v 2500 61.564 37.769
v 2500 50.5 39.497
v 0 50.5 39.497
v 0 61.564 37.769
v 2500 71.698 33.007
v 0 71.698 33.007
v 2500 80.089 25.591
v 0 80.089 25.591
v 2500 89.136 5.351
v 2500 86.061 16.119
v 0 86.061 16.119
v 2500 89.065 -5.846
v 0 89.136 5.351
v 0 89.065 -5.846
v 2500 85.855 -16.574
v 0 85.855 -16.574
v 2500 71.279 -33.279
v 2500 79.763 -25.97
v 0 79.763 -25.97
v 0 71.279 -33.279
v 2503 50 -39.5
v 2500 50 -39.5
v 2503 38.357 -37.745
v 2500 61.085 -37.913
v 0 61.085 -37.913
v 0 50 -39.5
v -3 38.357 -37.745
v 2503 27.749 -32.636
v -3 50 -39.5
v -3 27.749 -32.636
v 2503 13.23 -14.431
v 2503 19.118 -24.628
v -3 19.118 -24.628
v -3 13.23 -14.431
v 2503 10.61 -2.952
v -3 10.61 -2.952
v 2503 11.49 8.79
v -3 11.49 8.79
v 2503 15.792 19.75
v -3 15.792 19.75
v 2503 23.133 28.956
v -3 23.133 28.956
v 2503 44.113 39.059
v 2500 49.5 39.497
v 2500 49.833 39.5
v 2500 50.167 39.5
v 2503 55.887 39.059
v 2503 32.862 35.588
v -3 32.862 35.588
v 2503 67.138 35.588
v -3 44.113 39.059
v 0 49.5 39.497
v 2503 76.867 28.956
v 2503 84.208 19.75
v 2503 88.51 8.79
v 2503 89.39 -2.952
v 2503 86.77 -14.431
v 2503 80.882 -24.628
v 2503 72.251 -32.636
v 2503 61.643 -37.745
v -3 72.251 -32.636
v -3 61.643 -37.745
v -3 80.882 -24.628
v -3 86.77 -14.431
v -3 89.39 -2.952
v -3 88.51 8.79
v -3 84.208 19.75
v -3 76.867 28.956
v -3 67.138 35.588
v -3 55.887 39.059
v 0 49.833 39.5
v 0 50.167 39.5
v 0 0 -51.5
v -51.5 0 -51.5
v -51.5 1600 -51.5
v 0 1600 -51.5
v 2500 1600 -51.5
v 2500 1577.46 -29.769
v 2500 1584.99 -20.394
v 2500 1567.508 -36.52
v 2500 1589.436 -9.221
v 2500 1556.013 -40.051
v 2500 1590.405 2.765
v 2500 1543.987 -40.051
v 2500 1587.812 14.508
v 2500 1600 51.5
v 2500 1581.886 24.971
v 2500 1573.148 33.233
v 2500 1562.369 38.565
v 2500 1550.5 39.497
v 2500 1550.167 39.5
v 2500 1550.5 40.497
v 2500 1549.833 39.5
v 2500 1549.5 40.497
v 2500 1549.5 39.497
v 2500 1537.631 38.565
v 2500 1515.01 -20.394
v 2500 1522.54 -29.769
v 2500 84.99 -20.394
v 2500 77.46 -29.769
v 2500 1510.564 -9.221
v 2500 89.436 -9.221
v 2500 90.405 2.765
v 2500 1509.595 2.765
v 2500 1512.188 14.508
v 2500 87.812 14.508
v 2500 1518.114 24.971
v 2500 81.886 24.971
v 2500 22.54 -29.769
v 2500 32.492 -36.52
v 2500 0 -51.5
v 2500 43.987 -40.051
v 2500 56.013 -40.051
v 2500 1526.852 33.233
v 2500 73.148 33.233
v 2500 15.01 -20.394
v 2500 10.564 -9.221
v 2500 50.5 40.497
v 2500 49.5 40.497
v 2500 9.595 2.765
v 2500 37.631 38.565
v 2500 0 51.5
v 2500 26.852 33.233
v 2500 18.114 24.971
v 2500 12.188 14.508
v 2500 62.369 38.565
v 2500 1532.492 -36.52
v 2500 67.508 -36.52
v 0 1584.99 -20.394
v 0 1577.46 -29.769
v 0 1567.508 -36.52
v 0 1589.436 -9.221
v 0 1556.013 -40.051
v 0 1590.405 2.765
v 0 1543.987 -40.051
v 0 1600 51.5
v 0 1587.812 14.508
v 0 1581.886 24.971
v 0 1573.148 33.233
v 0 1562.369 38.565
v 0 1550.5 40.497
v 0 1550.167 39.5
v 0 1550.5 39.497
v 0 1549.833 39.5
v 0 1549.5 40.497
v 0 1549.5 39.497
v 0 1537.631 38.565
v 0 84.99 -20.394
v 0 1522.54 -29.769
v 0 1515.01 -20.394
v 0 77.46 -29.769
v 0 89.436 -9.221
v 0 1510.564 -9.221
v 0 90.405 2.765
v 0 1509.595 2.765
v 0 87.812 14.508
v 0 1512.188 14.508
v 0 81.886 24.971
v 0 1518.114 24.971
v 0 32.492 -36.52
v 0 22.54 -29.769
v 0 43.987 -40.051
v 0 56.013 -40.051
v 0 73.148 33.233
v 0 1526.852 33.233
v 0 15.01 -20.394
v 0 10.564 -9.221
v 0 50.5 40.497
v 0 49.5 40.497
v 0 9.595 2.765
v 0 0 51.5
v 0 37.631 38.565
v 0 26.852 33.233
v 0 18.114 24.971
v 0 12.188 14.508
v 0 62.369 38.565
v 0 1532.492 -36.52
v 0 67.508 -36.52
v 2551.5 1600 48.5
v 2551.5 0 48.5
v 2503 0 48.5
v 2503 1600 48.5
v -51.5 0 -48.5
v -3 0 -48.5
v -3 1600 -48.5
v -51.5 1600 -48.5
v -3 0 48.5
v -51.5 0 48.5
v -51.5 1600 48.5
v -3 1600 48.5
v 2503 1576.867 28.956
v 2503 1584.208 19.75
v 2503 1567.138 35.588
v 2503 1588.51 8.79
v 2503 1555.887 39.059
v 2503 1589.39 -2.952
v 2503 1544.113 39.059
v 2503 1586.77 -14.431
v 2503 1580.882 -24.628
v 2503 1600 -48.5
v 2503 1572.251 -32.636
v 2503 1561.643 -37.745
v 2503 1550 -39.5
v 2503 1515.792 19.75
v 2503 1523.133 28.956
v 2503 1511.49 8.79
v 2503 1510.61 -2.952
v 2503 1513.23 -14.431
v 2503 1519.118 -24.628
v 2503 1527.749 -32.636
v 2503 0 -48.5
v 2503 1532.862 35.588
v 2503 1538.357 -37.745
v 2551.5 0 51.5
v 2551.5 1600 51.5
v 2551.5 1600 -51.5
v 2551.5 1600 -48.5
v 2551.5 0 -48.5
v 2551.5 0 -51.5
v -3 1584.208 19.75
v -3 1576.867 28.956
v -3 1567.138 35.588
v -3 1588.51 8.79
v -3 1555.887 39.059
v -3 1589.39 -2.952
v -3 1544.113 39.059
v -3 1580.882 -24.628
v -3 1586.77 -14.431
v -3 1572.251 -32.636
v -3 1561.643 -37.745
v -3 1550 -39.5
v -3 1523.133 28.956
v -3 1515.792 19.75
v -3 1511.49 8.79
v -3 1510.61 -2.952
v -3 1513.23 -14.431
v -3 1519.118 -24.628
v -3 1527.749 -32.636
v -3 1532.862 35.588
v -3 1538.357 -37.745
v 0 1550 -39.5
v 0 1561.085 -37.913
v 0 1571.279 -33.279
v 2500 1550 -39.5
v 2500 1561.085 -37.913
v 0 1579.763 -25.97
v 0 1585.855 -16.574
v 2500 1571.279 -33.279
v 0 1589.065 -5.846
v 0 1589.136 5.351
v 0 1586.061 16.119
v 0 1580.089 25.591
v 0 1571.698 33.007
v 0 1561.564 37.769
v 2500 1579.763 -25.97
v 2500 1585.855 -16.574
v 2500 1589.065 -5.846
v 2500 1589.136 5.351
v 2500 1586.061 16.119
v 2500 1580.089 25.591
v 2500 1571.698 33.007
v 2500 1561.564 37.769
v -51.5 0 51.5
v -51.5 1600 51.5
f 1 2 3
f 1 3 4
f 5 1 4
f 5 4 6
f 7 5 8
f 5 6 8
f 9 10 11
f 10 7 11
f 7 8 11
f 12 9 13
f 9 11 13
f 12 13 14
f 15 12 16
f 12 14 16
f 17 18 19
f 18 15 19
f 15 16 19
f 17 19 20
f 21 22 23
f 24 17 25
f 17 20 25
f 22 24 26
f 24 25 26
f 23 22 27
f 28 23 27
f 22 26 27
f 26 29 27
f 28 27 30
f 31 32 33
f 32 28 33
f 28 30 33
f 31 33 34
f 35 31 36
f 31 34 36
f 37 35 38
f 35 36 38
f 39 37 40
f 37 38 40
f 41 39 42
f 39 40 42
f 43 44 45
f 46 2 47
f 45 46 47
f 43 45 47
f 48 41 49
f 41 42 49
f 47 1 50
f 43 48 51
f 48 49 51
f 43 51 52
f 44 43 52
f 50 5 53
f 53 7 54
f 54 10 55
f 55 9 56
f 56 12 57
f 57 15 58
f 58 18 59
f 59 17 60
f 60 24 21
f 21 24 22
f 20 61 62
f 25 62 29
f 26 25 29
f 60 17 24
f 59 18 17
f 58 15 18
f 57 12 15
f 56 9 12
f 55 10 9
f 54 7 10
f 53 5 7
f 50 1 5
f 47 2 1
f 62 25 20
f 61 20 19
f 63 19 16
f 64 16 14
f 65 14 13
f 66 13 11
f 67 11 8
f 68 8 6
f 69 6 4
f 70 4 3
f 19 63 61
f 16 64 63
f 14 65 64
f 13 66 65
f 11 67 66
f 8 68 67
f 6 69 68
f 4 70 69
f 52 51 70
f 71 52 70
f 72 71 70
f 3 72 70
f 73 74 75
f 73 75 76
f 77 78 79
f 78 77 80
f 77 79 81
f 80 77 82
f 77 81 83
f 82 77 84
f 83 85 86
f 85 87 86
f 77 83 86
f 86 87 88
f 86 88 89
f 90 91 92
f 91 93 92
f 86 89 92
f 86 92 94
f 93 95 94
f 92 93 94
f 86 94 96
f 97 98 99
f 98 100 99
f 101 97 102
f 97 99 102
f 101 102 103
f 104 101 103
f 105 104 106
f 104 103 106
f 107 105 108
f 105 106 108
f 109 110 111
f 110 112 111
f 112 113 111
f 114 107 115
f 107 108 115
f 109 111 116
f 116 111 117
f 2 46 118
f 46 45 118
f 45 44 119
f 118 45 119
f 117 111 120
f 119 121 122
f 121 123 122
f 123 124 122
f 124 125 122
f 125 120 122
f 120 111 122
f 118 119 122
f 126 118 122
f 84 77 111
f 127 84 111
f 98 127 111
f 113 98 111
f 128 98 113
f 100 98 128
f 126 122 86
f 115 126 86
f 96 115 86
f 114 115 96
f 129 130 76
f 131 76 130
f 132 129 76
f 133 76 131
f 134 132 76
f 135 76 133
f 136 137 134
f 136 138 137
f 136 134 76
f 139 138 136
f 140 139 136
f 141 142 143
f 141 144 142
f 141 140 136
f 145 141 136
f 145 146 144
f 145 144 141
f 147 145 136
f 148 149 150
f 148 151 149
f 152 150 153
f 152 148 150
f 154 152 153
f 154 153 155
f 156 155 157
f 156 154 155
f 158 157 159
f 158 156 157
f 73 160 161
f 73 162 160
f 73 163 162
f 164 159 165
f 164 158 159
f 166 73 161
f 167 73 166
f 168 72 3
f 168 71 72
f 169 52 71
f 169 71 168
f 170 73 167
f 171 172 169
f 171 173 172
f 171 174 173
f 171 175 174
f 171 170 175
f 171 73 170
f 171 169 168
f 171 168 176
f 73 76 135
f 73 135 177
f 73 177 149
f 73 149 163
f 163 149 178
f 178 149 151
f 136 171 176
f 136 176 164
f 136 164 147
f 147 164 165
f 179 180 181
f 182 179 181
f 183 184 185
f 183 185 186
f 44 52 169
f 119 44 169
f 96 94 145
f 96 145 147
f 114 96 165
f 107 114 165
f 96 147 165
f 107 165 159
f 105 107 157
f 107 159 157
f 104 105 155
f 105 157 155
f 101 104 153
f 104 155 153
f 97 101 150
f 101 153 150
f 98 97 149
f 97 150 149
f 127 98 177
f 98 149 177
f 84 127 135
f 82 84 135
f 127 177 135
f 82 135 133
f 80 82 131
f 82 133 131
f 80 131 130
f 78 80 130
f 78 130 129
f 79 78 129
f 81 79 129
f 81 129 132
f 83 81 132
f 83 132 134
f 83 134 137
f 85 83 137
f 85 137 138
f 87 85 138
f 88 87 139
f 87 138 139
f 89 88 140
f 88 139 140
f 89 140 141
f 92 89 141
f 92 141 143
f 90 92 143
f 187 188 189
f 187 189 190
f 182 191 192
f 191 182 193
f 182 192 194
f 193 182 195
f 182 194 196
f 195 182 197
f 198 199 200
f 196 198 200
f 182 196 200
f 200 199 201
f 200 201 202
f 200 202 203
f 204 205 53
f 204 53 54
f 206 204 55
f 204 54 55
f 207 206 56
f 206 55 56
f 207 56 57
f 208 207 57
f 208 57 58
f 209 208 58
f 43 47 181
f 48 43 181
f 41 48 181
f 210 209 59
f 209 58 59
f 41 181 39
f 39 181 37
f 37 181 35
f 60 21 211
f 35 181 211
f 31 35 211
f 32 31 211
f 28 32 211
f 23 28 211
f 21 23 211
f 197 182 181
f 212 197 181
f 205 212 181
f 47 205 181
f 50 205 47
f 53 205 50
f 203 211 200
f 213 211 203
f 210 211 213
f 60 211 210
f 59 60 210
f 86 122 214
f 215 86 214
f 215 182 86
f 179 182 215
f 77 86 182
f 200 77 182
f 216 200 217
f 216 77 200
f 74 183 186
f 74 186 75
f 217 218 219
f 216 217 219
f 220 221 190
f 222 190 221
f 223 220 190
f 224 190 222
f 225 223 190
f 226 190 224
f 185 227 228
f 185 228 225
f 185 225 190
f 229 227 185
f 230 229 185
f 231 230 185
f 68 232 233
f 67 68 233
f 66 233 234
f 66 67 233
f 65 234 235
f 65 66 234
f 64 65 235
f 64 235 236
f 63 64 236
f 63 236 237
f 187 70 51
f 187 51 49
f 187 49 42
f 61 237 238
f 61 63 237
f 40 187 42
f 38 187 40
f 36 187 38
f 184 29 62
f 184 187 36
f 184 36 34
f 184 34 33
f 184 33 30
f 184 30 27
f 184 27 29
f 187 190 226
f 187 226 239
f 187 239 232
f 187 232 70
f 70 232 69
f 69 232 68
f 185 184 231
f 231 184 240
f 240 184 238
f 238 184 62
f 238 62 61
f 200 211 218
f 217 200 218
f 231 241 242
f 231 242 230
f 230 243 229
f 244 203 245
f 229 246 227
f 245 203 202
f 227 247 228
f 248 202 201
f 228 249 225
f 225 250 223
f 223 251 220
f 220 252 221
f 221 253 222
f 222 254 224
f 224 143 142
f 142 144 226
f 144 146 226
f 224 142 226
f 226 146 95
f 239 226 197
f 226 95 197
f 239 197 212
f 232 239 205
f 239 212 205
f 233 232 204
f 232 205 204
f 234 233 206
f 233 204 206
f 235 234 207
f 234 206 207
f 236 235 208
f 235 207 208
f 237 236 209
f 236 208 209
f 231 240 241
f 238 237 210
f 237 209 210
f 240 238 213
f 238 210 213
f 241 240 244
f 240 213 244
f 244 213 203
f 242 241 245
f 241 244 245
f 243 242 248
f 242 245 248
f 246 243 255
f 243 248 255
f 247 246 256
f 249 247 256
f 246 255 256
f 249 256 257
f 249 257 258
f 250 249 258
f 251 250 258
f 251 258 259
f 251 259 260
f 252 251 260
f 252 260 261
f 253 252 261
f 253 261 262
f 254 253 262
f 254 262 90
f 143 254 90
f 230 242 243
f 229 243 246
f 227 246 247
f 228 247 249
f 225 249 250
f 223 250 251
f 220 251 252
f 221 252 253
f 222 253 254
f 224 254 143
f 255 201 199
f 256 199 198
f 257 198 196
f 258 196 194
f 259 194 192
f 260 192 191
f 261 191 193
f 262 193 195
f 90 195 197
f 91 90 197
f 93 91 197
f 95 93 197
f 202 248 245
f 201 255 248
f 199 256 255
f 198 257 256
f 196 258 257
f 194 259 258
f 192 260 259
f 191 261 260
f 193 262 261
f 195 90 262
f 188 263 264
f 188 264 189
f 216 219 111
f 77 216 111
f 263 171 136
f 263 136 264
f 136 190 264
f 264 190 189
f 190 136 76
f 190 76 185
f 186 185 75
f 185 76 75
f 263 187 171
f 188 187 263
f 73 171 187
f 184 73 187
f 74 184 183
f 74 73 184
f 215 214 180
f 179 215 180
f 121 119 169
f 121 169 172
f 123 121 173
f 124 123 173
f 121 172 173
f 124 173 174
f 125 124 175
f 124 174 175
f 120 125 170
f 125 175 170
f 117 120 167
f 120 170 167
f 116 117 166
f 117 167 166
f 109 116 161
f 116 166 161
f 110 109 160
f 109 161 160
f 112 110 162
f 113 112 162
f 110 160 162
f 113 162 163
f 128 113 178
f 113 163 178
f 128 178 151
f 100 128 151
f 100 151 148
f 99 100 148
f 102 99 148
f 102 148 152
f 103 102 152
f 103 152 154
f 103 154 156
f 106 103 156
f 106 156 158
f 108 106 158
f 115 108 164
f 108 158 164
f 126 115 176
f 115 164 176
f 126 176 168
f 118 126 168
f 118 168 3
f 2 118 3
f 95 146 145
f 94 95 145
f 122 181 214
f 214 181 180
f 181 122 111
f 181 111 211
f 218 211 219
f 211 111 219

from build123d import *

# Parameters (mm, degrees)
BOSS_EXTRUDE1_DEPTH     = 1600
BOSS_EXTRUDE1_2_DEPTH   = 1600
SKETCH4_R               = 39.5
CUT_EXTRUDE2_DEPTH      = 2552.5
CUT_EXTRUDE2_DEPTH_BACK = 52.5
BOSS_EXTRUDE2_DEPTH     = 2500


with BuildPart() as part:
    # Sketch3 → Boss-Extrude1 (new body)
    with BuildSketch(Plane(origin=(0, 0, 0), x_dir=(1, 0, 0), z_dir=(0, 1, 0))):
        Polygon((-51.5, 51.5), (0, 51.5), (0, -51.5), (-51.5, -51.5), (-51.5, -48.5), (-3, -48.5), (-3, 48.5), (-51.5, 48.5), align=None)
    extrude(amount=BOSS_EXTRUDE1_DEPTH)


with BuildPart() as body_2:
    # Sketch3 → Boss-Extrude1 2 (new body)
    with BuildSketch(Plane(origin=(0, 0, 0), x_dir=(1, 0, 0), z_dir=(0, 1, 0))):
        Polygon((2503, 48.5), (2551.5, 48.5), (2551.5, 51.5), (2500, 51.5), (2500, -51.5), (2551.5, -51.5), (2551.5, -48.5), (2503, -48.5), align=None)
    extrude(amount=BOSS_EXTRUDE1_2_DEPTH)


with BuildPart() as cut_extrude2_tool:
    # Sketch4 → Cut-Extrude2 (new body, two sides)
    with BuildSketch(Plane(origin=(0, 0, 0), x_dir=(0, 0, -1), z_dir=(1, 0, 0))) as cut_extrude2_sk:
        with Locations((0, 1550)):
            Circle(SKETCH4_R)
        with Locations((0, 50)):
            Circle(SKETCH4_R)
    extrude(amount=CUT_EXTRUDE2_DEPTH)
    extrude(cut_extrude2_sk.sketch, amount=-CUT_EXTRUDE2_DEPTH_BACK)


with BuildPart() as part_1:
    add(part.part)

    # Cut-Extrude2: cut by cut_extrude2_tool
    add(cut_extrude2_tool.part, mode=Mode.SUBTRACT)



with BuildPart() as body_2_1:
    add(body_2.part)

    # Cut-Extrude2: cut by cut_extrude2_tool
    add(cut_extrude2_tool.part, mode=Mode.SUBTRACT)


with BuildPart() as part_2:
    add(part_1.part)

    add(body_2_1.part)  # Boss-Extrude2 merges body 2
    # Sketch5 → Boss-Extrude2 (add)
    with BuildSketch(Plane(origin=(0, 0, 0), x_dir=(0, 0, -1), z_dir=(1, 0, 0))):
        with BuildLine():
            Line((-39.496835316, 49.5), (-40.496913463, 49.5))
            ThreePointArc((-40.496913463, 49.5), (40.5, 50), (-40.496913463, 50.5))
            Line((-40.496913463, 50.5), (-39.496835316, 50.5))
            ThreePointArc((-39.496835316, 50.5), (39.5, 50), (-39.496835316, 49.5))
        make_face()
        with BuildLine():
            Line((-39.496835316, 1549.5), (-40.496913463, 1549.5))
            ThreePointArc((-40.496913463, 1549.5), (40.5, 1550), (-40.496913463, 1550.5))
            Line((-40.496913463, 1550.5), (-39.496835316, 1550.5))
            ThreePointArc((-39.496835316, 1550.5), (39.5, 1550), (-39.496835316, 1549.5))
        make_face()
    extrude(amount=BOSS_EXTRUDE2_DEPTH)


solid = part_2.part
